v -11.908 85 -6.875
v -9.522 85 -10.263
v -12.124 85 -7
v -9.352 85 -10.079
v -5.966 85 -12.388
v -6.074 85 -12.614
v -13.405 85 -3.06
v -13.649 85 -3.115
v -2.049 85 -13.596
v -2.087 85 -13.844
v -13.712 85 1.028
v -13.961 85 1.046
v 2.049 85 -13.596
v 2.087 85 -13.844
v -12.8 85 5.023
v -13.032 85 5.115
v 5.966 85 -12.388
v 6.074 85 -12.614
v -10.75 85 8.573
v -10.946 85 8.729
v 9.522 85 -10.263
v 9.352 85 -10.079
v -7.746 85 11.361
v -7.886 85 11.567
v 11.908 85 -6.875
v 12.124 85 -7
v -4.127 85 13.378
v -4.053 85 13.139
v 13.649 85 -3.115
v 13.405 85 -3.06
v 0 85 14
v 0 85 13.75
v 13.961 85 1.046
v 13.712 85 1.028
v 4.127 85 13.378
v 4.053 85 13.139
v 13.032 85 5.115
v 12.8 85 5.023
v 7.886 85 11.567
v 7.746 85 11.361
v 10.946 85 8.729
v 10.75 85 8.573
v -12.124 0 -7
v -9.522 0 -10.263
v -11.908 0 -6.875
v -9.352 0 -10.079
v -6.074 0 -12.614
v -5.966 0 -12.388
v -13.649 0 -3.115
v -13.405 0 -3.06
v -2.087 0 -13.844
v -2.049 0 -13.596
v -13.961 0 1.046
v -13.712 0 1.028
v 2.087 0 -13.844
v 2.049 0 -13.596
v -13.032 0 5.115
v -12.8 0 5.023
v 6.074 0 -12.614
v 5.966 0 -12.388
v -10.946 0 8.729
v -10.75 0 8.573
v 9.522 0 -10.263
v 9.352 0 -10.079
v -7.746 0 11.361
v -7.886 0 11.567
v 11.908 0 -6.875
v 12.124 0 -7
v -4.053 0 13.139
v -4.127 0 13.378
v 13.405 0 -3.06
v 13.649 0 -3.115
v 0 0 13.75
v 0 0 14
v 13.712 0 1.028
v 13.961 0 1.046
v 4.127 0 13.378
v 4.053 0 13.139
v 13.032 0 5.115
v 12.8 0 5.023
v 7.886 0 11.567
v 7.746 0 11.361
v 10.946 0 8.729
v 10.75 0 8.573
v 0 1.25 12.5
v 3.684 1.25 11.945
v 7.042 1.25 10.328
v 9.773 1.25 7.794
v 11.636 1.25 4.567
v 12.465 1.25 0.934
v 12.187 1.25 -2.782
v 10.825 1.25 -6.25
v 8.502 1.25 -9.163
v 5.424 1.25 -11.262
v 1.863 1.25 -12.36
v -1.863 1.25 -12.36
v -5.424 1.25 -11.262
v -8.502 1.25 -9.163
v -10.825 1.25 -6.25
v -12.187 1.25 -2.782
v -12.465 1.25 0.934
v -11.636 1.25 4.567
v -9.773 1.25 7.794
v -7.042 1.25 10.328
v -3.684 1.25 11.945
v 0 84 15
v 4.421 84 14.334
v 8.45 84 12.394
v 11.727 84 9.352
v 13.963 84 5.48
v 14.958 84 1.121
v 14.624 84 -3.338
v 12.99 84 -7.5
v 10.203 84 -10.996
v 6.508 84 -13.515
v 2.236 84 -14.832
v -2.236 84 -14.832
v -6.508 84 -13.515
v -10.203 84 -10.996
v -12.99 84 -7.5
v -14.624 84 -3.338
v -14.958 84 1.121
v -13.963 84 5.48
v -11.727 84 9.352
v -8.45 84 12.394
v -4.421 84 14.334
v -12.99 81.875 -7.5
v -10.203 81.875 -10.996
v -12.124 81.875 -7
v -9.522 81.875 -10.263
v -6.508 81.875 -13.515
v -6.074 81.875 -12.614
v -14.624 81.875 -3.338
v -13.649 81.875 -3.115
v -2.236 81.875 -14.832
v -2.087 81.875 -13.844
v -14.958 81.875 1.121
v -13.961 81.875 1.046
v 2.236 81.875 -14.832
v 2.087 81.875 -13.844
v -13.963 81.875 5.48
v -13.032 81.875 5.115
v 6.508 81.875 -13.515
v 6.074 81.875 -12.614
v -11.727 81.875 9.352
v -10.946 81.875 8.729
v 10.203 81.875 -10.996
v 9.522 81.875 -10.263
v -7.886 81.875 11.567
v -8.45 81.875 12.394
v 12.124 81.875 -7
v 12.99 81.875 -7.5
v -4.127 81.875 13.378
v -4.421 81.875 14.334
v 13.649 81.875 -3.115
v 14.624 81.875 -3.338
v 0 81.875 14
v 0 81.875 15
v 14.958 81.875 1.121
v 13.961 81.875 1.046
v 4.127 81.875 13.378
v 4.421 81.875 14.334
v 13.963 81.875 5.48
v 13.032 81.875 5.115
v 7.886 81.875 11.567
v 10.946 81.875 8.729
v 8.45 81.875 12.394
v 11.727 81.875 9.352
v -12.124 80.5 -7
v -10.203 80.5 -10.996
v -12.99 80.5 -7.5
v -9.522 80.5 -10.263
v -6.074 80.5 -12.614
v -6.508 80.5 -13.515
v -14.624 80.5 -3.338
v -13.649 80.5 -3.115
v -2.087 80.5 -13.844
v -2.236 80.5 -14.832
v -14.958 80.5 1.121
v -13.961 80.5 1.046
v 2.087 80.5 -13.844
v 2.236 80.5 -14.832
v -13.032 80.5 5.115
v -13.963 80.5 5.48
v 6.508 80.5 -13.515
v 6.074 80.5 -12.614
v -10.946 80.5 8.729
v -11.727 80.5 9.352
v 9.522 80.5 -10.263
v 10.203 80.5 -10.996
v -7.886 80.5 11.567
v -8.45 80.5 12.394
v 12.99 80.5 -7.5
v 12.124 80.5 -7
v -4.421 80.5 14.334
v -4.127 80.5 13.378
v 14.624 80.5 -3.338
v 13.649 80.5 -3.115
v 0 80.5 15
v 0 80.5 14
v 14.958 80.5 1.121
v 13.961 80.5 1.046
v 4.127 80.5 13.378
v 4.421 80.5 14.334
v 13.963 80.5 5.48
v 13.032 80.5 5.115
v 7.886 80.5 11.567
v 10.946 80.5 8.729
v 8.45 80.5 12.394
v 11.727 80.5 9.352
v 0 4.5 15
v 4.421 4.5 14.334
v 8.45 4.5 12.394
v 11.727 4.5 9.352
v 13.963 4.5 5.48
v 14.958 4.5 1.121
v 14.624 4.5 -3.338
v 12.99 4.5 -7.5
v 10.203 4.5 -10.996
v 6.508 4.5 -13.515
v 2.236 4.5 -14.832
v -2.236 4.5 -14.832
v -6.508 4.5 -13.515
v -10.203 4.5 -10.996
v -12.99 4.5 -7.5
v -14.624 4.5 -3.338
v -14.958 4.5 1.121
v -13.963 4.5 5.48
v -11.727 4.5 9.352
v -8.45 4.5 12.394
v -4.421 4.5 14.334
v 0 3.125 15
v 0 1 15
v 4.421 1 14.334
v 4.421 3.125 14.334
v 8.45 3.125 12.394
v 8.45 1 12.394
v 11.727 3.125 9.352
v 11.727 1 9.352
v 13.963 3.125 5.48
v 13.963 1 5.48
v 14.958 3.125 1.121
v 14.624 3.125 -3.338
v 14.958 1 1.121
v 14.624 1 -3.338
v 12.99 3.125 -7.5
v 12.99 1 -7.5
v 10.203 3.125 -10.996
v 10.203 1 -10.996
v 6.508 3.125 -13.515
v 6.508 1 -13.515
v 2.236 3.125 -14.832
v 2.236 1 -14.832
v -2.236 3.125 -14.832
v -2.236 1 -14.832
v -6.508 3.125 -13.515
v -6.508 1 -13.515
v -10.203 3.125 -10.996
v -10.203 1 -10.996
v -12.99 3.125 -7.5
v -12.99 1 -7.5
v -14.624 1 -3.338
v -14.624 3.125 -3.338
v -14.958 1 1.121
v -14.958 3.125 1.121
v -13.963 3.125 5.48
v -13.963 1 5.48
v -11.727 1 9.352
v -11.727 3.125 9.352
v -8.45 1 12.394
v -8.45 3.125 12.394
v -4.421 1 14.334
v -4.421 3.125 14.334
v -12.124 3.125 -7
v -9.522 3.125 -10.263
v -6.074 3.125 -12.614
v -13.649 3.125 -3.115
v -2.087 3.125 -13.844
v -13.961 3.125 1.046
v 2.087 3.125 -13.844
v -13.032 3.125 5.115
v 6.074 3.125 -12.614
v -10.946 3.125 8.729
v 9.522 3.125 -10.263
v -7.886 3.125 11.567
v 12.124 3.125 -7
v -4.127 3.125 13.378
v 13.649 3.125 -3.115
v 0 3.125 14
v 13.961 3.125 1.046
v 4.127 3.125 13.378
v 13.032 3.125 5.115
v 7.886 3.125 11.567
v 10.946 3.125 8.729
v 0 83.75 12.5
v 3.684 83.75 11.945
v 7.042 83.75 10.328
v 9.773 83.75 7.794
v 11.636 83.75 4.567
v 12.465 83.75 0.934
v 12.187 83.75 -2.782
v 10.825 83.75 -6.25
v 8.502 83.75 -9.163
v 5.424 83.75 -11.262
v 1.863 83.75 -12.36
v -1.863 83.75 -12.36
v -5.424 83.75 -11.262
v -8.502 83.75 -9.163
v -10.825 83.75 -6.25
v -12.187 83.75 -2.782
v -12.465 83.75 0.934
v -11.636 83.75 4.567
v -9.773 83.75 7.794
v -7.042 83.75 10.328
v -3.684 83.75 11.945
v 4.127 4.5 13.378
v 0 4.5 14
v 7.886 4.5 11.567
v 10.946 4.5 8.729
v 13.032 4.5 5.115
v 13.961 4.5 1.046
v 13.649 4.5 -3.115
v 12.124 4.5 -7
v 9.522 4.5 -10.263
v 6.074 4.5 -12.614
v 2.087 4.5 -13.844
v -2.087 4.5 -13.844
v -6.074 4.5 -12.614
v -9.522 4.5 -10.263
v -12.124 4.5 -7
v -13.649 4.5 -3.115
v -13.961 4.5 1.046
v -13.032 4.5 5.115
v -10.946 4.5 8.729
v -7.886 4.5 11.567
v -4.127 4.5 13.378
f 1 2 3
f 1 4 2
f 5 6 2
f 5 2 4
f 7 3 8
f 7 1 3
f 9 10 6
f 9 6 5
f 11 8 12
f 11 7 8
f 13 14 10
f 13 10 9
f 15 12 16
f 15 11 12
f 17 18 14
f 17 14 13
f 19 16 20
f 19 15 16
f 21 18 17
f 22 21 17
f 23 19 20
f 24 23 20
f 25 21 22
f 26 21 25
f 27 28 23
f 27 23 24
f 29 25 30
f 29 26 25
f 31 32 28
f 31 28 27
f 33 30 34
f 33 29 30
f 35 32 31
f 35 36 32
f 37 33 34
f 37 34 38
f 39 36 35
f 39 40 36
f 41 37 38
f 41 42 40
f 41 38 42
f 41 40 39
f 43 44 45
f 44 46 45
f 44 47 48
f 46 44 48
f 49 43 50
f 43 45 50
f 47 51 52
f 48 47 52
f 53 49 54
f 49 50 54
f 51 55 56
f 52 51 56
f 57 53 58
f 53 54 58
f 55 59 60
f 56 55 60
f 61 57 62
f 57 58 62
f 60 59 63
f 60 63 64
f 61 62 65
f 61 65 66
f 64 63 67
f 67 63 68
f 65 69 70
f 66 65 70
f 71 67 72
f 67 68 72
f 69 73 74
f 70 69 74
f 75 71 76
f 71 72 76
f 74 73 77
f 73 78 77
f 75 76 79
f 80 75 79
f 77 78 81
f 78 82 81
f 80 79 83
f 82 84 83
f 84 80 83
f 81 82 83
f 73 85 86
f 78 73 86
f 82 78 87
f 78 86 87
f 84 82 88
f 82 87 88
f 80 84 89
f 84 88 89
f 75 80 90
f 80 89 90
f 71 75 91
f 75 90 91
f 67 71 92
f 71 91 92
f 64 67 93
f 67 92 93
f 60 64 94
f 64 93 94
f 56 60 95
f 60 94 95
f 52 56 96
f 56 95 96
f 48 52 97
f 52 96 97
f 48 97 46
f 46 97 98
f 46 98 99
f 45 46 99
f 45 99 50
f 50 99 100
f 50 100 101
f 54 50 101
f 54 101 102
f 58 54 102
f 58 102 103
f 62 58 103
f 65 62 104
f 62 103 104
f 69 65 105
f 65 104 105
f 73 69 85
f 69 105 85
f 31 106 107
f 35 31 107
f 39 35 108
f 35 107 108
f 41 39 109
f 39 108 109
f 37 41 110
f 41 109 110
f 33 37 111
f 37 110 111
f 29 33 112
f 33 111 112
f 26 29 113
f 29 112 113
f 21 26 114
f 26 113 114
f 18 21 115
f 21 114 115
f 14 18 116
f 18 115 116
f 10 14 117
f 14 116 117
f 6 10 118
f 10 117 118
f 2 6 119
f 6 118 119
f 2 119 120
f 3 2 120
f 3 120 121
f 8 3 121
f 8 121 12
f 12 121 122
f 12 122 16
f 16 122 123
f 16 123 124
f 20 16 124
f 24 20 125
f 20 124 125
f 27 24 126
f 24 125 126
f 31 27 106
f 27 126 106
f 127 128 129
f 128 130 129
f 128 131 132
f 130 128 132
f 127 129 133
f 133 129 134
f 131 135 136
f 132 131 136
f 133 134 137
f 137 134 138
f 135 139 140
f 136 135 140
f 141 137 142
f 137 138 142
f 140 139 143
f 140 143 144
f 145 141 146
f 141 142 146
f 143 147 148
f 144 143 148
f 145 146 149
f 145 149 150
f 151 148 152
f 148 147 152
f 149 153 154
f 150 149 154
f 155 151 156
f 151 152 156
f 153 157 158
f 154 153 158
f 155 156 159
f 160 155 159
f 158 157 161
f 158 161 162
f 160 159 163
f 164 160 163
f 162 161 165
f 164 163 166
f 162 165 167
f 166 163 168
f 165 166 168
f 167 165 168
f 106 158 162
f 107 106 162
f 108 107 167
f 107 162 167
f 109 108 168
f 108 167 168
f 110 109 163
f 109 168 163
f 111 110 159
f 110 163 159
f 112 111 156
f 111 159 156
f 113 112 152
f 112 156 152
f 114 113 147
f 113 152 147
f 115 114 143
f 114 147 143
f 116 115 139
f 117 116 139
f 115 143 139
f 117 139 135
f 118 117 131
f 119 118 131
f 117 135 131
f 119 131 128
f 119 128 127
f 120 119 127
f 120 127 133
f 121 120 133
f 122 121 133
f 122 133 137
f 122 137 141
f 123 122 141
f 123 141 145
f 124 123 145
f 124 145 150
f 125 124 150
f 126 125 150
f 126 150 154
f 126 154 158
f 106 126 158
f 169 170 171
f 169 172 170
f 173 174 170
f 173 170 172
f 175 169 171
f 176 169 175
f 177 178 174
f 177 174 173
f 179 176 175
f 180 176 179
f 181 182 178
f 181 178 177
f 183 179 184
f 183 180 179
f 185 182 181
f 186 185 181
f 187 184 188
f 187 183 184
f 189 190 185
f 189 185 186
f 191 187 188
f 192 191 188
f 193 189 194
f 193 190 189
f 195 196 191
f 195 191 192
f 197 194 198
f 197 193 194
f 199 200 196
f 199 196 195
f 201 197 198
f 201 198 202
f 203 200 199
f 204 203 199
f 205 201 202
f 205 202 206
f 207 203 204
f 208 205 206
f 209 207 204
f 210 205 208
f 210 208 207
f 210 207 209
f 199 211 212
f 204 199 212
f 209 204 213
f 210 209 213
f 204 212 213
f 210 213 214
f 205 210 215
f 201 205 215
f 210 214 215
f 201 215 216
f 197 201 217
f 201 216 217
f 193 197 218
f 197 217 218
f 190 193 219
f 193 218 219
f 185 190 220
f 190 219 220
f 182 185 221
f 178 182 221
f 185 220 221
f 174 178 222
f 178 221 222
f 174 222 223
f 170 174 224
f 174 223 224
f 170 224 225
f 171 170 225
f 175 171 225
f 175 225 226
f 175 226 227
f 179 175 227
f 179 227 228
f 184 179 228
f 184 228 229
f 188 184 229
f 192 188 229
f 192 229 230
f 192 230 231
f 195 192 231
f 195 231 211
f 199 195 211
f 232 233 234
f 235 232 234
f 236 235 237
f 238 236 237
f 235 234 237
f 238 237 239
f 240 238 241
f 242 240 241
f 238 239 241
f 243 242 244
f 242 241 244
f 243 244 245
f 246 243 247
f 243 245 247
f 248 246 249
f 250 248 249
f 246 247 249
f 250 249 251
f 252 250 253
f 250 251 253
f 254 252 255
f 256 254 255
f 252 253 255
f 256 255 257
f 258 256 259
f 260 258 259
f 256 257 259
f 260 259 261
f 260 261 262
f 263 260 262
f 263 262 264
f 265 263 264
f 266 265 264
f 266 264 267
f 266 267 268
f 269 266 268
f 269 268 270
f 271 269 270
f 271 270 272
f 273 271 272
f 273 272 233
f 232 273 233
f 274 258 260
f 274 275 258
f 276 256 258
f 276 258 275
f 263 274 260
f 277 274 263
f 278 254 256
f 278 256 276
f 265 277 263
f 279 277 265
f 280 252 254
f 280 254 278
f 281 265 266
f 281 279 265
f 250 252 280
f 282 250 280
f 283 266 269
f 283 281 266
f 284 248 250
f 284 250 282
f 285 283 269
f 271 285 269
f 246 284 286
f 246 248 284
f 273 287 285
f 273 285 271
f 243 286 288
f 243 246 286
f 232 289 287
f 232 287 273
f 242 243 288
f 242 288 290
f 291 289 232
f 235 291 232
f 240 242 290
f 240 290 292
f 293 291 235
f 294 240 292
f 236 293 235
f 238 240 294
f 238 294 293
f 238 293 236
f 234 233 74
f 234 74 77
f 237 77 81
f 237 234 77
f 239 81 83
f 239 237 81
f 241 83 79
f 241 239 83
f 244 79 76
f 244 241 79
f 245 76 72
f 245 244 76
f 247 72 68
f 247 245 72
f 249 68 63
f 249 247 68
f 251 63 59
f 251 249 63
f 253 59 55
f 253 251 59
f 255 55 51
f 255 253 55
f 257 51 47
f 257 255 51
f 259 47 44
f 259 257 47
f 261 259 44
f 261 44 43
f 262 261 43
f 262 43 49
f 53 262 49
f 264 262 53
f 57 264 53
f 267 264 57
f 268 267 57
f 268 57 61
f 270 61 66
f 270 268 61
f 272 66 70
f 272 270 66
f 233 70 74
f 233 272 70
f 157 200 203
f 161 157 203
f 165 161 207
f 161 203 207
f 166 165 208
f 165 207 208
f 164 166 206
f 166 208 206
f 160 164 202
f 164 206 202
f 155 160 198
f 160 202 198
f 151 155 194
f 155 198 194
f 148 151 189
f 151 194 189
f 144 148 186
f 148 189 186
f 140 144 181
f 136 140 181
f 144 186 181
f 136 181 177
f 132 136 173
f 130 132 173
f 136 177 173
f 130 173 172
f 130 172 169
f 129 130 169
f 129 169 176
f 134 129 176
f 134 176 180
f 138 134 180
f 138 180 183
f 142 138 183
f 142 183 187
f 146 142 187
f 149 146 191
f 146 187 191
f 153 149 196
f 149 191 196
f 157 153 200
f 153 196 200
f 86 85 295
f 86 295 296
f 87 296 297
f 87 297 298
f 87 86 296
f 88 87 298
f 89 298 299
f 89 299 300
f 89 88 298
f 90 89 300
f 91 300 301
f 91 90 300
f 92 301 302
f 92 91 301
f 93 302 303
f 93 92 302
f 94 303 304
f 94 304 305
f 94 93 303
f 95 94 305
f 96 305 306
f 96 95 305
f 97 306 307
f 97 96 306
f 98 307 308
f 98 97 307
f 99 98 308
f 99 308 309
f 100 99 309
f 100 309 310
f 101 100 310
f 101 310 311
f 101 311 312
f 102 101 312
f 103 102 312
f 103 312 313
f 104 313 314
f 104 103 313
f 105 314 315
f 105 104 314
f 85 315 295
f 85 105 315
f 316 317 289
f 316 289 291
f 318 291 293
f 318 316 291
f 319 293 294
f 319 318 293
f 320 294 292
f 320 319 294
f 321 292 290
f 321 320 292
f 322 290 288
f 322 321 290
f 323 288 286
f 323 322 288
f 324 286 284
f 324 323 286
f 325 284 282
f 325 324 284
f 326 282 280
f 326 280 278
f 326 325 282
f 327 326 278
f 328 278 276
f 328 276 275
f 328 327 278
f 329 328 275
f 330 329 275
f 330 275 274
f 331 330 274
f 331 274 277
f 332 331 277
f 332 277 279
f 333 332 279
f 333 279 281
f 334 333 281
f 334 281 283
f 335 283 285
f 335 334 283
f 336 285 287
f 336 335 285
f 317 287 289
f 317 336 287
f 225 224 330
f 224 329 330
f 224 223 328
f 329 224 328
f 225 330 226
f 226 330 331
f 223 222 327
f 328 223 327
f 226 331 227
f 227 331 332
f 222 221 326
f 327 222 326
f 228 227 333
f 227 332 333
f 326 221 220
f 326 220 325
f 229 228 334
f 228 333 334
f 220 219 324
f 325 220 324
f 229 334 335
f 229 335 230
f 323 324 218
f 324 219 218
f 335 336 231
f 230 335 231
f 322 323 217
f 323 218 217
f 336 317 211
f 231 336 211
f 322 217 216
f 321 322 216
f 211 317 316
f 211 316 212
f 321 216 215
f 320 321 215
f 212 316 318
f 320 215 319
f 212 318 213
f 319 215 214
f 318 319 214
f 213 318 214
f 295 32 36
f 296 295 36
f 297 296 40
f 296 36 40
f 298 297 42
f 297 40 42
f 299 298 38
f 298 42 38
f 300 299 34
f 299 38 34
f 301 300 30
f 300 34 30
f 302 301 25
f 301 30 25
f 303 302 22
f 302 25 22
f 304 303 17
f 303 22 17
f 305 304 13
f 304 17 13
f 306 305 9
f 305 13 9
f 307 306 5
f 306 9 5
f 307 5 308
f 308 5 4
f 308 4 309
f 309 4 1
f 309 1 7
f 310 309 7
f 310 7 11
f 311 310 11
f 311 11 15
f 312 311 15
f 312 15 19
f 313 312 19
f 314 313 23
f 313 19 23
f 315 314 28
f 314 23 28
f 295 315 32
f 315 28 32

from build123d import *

# Parameters (mm, degrees)
SKETCH1_R           = 15
SKETCH1_R_2         = 12.5
BOSS_EXTRUDE1_DEPTH = 85
CUT_EXTRUDE1_START  = -1.375
SKETCH2_R           = 15
SKETCH2_R_2         = 14
CUT_EXTRUDE1_DEPTH  = 1.375
CHAMFER1_SIZE       = 1.25
CHAMFER2_SIZE       = 1


with BuildPart() as part:
    # Sketch1 → Boss-Extrude1 (new body)
    with BuildSketch(Plane(origin=(0, 0, 0), x_dir=(1, 0, 0), z_dir=(0, 1, 0))):
        with Locations(Location((0, 0, 0), (0, 0, 270))):
            Circle(SKETCH1_R)
        with Locations(Location((0, 0, 0), (0, 0, 270))):
            Circle(SKETCH1_R_2, mode=Mode.SUBTRACT)
    extrude(amount=BOSS_EXTRUDE1_DEPTH)

    # Sketch2 → Cut-Extrude1 (cut)
    with BuildSketch(Plane(origin=(0, 81.875, 0), x_dir=(1, 0, 0), z_dir=(0, 1, 0)).offset(CUT_EXTRUDE1_START)):
        with Locations(Location((0, 0, 0), (0, 0, 270))):
            Circle(SKETCH2_R)
        with Locations(Location((0, 0, 0), (0, 0, 270))):
            Circle(SKETCH2_R_2, mode=Mode.SUBTRACT)
    cut_extrude1 = extrude(amount=CUT_EXTRUDE1_DEPTH, mode=Mode.SUBTRACT)

    # Mirror1: Cut-Extrude1 across plane
    add(cut_extrude1.mirror(Plane.ZX.offset(42.5)), mode=Mode.SUBTRACT)

    # Chamfer1
    chamfer1_edges = [part.edges().sort_by_distance(p)[0] for p in [
        (0, 0, -12.5),
        (0, 85, -12.5),
    ]]
    chamfer(chamfer1_edges, length=CHAMFER1_SIZE)

    # Chamfer2
    chamfer2_edges = [part.edges().sort_by_distance(p)[0] for p in [
        (0, 0, -15),
        (0, 85, -15),
    ]]
    chamfer(chamfer2_edges, length=CHAMFER2_SIZE)


solid = part.part
